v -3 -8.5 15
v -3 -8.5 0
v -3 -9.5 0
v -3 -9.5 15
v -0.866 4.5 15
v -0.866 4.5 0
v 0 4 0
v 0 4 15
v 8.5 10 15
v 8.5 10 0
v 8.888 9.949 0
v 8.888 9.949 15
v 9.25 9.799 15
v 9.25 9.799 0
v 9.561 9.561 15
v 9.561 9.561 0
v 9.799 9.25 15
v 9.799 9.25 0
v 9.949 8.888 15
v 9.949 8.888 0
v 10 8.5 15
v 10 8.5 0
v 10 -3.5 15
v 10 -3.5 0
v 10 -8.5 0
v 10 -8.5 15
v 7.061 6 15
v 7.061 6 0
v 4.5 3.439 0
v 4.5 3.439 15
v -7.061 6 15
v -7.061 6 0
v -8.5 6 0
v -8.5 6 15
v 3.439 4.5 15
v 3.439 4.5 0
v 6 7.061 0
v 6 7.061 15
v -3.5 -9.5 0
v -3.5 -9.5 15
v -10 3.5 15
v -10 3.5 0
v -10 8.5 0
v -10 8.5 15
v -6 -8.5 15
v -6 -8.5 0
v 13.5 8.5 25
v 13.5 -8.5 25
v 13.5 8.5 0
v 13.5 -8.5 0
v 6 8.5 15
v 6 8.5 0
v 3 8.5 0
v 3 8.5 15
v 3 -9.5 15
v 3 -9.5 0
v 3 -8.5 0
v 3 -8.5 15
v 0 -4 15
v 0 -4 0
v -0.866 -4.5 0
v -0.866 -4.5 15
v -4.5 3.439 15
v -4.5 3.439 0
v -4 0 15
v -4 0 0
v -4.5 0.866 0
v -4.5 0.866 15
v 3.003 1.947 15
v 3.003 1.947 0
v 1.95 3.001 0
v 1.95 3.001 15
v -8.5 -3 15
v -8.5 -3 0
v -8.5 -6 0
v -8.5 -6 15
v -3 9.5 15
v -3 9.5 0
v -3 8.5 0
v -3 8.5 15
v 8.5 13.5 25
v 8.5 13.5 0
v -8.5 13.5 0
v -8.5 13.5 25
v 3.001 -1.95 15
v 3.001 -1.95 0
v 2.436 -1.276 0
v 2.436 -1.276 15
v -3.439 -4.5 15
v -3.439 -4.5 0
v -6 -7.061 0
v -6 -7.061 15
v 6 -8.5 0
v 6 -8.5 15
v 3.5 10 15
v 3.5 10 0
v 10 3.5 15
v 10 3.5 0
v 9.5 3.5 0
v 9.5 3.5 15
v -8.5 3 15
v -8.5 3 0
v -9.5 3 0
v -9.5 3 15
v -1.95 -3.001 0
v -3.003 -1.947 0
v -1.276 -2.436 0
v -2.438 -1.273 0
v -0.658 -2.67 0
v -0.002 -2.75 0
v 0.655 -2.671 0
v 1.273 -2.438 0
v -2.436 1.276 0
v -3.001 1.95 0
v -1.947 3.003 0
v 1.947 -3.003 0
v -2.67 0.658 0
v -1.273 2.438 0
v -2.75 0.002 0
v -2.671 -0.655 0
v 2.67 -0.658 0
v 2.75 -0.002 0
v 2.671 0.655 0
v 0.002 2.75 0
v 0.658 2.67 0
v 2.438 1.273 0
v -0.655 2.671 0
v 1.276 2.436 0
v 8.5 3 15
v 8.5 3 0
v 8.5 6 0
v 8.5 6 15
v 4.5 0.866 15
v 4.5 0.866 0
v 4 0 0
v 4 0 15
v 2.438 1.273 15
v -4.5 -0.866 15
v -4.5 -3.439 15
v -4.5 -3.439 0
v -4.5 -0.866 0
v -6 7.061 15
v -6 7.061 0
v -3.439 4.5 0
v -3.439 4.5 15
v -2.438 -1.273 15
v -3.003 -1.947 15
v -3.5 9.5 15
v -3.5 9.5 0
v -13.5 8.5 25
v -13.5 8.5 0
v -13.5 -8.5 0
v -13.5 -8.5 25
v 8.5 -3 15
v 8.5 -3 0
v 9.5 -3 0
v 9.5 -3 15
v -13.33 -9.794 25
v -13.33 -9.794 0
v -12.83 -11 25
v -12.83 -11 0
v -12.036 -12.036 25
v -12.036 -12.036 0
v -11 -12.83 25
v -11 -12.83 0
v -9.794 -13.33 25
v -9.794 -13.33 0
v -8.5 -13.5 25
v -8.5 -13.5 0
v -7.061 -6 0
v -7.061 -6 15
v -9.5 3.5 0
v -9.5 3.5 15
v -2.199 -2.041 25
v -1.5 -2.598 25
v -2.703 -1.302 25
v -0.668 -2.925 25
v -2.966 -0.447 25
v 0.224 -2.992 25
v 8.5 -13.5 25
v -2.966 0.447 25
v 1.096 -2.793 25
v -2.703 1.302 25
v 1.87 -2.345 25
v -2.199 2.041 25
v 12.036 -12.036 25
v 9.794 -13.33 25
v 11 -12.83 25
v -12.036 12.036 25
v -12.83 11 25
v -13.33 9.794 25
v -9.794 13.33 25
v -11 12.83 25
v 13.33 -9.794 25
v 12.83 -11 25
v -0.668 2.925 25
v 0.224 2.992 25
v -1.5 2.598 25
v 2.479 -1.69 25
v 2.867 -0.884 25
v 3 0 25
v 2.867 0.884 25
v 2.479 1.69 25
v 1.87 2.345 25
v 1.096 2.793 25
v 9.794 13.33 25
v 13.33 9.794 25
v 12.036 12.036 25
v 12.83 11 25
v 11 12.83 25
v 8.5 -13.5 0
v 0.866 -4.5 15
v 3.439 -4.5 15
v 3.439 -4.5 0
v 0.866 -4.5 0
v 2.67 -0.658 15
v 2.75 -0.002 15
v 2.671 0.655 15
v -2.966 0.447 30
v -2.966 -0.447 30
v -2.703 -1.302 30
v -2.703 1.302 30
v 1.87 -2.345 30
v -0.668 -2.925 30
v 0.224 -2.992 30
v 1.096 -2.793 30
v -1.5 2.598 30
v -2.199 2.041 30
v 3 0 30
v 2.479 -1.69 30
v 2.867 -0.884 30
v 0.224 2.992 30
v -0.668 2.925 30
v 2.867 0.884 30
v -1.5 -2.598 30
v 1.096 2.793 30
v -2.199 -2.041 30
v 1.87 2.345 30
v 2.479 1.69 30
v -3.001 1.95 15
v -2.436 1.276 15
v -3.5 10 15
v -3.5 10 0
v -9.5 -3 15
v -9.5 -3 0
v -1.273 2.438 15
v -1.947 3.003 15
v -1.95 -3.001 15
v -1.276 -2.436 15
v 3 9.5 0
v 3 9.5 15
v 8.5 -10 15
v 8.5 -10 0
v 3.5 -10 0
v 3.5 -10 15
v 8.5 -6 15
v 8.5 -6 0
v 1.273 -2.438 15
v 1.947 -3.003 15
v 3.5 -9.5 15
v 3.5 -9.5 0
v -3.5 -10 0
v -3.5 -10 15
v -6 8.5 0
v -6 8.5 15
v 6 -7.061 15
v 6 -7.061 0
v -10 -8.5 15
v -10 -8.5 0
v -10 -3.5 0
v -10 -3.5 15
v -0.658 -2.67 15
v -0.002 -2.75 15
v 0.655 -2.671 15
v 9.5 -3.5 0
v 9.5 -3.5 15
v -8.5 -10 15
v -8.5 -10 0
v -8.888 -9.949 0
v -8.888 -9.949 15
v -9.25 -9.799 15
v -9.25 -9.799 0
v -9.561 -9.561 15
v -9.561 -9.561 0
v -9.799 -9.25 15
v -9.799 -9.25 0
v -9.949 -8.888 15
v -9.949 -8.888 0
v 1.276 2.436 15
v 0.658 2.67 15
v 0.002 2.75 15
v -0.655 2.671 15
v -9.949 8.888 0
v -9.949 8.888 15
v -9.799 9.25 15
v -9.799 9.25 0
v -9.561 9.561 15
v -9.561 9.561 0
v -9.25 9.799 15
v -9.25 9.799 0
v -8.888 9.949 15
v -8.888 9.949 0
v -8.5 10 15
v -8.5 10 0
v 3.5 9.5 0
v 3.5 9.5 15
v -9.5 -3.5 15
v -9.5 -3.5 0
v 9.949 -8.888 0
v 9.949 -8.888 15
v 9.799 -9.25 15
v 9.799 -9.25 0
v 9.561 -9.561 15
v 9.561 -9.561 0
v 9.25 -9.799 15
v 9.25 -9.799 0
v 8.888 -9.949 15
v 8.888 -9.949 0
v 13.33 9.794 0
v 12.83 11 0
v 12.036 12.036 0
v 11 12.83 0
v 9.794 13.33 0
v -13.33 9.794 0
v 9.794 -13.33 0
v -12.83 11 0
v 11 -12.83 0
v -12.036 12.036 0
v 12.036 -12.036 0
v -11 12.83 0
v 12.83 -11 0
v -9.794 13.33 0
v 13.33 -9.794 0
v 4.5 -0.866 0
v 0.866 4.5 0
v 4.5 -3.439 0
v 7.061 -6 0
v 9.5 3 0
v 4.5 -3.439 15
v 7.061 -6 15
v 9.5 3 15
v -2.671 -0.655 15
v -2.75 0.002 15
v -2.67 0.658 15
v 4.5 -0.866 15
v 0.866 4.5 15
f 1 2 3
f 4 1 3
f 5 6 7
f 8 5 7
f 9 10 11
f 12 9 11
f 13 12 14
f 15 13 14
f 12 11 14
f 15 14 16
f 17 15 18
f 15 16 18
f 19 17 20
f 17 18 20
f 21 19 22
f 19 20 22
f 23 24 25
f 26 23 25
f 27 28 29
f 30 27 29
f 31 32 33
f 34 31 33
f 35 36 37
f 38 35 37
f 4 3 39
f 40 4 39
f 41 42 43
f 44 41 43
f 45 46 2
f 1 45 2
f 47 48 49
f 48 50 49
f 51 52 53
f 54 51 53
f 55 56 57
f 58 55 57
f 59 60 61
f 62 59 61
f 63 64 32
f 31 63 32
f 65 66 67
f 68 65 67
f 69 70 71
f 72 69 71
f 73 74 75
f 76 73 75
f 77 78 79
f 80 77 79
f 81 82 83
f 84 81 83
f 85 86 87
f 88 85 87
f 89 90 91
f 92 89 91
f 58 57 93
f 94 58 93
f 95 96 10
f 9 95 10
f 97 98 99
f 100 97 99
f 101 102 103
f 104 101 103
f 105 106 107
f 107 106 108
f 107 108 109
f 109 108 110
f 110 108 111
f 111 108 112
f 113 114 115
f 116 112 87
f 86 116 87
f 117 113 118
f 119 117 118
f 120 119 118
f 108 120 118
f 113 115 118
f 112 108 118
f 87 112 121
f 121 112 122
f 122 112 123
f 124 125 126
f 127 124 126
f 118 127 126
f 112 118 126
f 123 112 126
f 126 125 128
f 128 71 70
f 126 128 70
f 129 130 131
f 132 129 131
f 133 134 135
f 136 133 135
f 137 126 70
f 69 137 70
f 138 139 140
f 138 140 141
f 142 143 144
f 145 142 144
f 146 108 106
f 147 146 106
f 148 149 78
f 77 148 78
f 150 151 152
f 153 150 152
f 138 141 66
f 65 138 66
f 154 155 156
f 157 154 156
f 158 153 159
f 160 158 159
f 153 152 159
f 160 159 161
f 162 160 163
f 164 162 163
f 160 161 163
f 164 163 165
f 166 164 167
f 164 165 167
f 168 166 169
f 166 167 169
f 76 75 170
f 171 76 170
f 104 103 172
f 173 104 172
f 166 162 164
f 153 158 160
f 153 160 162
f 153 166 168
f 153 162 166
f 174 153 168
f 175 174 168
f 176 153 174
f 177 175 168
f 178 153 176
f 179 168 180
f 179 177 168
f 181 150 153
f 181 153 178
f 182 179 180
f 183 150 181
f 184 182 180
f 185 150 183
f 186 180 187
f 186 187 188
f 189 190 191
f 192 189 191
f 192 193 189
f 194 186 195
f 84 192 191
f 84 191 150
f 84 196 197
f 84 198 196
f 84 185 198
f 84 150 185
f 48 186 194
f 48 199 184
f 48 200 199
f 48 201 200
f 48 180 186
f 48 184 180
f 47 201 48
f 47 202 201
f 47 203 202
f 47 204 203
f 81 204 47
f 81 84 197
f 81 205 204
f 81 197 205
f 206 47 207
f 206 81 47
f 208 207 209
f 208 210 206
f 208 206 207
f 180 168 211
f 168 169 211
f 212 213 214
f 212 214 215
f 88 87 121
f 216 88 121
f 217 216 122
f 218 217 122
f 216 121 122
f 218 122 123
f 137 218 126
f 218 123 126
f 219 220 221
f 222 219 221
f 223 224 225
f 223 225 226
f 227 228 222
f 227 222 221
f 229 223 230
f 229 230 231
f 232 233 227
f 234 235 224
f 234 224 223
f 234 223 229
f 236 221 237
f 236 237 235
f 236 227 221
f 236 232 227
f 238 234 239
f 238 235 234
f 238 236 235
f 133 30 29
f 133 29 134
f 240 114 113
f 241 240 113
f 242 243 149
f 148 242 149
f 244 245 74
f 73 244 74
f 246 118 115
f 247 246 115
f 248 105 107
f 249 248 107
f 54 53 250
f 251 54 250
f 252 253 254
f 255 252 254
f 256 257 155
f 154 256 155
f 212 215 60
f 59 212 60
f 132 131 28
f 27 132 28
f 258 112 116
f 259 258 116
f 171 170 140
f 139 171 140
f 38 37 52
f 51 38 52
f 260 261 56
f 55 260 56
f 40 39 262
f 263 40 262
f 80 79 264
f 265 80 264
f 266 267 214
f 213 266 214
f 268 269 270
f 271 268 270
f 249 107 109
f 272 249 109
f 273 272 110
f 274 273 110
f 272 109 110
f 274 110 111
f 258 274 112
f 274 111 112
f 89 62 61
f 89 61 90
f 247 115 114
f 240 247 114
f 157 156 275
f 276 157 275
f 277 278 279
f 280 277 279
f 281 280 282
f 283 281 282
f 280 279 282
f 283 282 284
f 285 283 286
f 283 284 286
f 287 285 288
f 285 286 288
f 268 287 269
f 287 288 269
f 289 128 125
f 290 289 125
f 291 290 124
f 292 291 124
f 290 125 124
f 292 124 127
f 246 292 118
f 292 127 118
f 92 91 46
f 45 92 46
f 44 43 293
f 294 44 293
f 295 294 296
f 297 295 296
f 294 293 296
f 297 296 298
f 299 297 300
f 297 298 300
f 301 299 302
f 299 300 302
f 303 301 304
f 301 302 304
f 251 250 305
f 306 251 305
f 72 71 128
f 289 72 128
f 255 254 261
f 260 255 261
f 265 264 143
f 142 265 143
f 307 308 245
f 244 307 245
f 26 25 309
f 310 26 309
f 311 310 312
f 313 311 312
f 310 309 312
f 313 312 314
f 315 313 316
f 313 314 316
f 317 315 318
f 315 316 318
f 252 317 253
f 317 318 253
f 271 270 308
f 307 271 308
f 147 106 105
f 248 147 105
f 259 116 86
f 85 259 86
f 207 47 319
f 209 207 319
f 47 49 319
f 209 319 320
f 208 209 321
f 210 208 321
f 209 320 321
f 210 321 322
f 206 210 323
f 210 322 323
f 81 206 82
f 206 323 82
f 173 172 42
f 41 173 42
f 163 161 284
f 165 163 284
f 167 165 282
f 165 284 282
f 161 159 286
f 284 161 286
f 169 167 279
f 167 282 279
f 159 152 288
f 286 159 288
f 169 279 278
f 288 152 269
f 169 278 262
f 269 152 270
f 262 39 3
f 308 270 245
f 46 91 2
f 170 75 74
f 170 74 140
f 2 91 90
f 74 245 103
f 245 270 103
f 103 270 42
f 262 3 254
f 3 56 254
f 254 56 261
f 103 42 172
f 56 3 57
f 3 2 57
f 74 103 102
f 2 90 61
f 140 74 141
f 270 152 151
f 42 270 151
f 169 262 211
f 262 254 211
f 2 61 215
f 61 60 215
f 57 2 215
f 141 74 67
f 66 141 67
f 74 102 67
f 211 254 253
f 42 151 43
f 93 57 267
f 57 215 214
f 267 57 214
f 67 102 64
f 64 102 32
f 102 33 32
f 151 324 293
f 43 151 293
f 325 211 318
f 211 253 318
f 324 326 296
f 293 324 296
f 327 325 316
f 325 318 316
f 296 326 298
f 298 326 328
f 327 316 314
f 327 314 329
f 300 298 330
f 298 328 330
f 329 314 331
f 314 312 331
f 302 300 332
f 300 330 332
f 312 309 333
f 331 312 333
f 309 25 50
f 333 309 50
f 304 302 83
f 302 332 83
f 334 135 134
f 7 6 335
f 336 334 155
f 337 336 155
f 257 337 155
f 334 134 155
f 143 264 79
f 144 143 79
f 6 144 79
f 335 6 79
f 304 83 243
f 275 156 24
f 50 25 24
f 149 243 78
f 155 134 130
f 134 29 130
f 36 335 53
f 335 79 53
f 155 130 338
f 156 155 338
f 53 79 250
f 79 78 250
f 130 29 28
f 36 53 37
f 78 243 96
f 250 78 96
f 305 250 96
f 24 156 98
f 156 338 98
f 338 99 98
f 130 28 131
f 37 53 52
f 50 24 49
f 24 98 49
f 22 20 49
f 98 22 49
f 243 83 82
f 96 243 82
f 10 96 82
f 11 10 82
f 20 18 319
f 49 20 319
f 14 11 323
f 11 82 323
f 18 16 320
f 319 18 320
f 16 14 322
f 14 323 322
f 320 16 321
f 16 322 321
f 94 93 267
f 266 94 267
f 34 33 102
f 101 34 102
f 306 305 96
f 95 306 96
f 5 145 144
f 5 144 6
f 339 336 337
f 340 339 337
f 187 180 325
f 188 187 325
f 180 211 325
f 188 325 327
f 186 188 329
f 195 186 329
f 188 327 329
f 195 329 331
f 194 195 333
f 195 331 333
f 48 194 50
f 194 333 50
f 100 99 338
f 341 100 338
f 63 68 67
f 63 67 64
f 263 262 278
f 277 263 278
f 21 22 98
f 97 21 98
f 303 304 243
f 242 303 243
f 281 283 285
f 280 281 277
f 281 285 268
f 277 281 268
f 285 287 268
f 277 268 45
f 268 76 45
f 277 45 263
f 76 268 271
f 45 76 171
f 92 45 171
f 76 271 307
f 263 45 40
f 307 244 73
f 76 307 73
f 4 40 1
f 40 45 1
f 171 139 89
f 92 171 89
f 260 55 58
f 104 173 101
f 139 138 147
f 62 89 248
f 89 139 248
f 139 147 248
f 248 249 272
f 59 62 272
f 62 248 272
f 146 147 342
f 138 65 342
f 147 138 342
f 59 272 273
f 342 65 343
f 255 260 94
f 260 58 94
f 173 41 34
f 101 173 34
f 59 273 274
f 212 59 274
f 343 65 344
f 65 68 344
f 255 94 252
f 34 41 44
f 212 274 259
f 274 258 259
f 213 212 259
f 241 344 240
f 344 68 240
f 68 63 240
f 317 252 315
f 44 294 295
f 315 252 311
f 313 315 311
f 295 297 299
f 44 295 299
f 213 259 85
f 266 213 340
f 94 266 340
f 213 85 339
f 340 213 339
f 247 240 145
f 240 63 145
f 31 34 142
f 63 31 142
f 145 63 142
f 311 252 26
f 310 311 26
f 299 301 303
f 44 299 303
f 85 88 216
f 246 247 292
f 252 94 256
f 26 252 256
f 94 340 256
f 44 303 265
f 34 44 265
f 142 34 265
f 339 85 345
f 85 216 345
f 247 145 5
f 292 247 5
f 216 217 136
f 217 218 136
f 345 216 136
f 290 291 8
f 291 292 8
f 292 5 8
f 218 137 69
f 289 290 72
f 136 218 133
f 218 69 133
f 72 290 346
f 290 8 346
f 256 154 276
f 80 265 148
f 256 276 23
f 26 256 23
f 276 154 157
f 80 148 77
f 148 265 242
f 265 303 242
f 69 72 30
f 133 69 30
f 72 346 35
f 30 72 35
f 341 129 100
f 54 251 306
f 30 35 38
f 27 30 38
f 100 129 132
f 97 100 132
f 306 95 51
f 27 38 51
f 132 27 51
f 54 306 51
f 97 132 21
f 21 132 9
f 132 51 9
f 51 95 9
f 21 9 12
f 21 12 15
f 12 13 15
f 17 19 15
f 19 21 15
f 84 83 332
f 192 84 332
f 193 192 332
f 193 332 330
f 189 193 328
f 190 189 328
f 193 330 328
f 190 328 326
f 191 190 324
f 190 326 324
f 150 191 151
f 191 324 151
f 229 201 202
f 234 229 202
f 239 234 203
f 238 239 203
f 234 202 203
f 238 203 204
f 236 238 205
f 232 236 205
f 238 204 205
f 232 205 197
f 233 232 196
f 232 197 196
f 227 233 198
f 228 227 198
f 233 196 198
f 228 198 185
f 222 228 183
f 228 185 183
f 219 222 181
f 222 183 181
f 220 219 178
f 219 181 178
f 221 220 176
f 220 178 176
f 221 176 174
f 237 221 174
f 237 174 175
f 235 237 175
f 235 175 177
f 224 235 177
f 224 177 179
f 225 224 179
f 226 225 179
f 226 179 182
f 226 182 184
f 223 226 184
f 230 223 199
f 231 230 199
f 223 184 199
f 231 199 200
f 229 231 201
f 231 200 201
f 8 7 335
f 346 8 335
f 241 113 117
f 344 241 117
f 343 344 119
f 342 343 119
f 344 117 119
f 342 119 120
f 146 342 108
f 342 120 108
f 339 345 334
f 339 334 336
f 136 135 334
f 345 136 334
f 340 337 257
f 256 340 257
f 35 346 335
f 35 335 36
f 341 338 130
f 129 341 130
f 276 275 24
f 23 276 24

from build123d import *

# Parameters (mm, degrees)
BOSS_EXTRU_5_DEPTH = 15
BOSS_EXTRU_6_DEPTH = 10
ESQUISSE7_R        = 3
BOSS_EXTRU_7_DEPTH = 5


# Read off the part's stored shape, not the designer's step: Boss.-Extru.5
with BuildPart() as part:
    # Boss.-Extru.5 outline → Boss.-Extru.5 (new body)
    # profile 1 of 2: a face of its own
    with BuildSketch(Plane.XY):
        with BuildLine():
            Line((-8.5, -13.5), (8.5, -13.5))
            ThreePointArc((8.5, -13.5), (12.035533906, -12.035533906), (13.5, -8.5))
            Line((13.5, -8.5), (13.5, 8.5))
            ThreePointArc((13.5, 8.5), (12.035533906, 12.035533906), (8.5, 13.5))
            Line((8.5, 13.5), (-8.5, 13.5))
            ThreePointArc((-8.5, 13.5), (-12.035533906, 12.035533906), (-13.5, 8.5))
            Line((-13.5, 8.5), (-13.5, -8.5))
            ThreePointArc((-13.5, -8.5), (-12.035533906, -12.035533906), (-8.5, -13.5))
        make_face()
        with BuildLine():
            Line((-10, 3.5), (-10, 8.5))
            ThreePointArc((-10, 8.5), (-9.560660172, 9.560660172), (-8.5, 10))
            Line((-8.5, 10), (-3.5, 10))
            Line((-3.5, 10), (-3.5, 9.5))
            Line((-3.5, 9.5), (-3, 9.5))
            Line((-3, 9.5), (-3, 8.5))
            Line((-3, 8.5), (-6, 8.5))
            Line((-6, 8.5), (-6, 7.060660172))
            Line((-6, 7.060660172), (-3.439339828, 4.5))
            Line((-3.439339828, 4.5), (-0.866025404, 4.5))
            Line((-0.866025404, 4.5), (0, 4))
            Line((0, 4), (0.866025404, 4.5))
            Line((0.866025404, 4.5), (3.439339828, 4.5))
            Line((3.439339828, 4.5), (6, 7.060660172))
            Line((6, 7.060660172), (6, 8.5))
            Line((6, 8.5), (3, 8.5))
            Line((3, 8.5), (3, 9.5))
            Line((3, 9.5), (3.5, 9.5))
            Line((3.5, 9.5), (3.5, 10))
            Line((3.5, 10), (8.5, 10))
            ThreePointArc((8.5, 10), (9.560660172, 9.560660172), (10, 8.5))
            Line((10, 8.5), (10, 3.5))
            Line((10, 3.5), (9.5, 3.5))
            Line((9.5, 3.5), (9.5, 3))
            Line((9.5, 3), (8.5, 3))
            Line((8.5, 3), (8.5, 6))
            Line((8.5, 6), (7.060660172, 6))
            Line((7.060660172, 6), (4.5, 3.439339828))
            Line((4.5, 3.439339828), (4.5, 0.866025404))
            Line((4.5, 0.866025404), (4, 0))
            Line((4, 0), (4.5, -0.866025404))
            Line((4.5, -0.866025404), (4.5, -3.439339828))
            Line((4.5, -3.439339828), (7.060660172, -6))
            Line((7.060660172, -6), (8.5, -6))
            Line((8.5, -6), (8.5, -3))
            Line((8.5, -3), (9.5, -3))
            Line((9.5, -3), (9.5, -3.5))
            Line((9.5, -3.5), (10, -3.5))
            Line((10, -3.5), (10, -8.5))
            ThreePointArc((10, -8.5), (9.560660172, -9.560660172), (8.5, -10))
            Line((8.5, -10), (3.5, -10))
            Line((3.5, -10), (3.5, -9.5))
            Line((3.5, -9.5), (3, -9.5))
            Line((3, -9.5), (3, -8.5))
            Line((3, -8.5), (6, -8.5))
            Line((6, -8.5), (6, -7.060660172))
            Line((6, -7.060660172), (3.439339828, -4.5))
            Line((3.439339828, -4.5), (0.866025404, -4.5))
            Line((0.866025404, -4.5), (0, -4))
            Line((0, -4), (-0.866025404, -4.5))
            Line((-0.866025404, -4.5), (-3.439339828, -4.5))
            Line((-3.439339828, -4.5), (-6, -7.060660172))
            Line((-6, -7.060660172), (-6, -8.5))
            Line((-6, -8.5), (-3, -8.5))
            Line((-3, -8.5), (-3, -9.5))
            Line((-3, -9.5), (-3.5, -9.5))
            Line((-3.5, -9.5), (-3.5, -10))
            Line((-3.5, -10), (-8.5, -10))
            ThreePointArc((-8.5, -10), (-9.560660172, -9.560660172), (-10, -8.5))
            Line((-10, -8.5), (-10, -3.5))
            Line((-10, -3.5), (-9.5, -3.5))
            Line((-9.5, -3.5), (-9.5, -3))
            Line((-9.5, -3), (-8.5, -3))
            Line((-8.5, -3), (-8.5, -6))
            Line((-8.5, -6), (-7.060660172, -6))
            Line((-7.060660172, -6), (-4.5, -3.439339828))
            Line((-4.5, -3.439339828), (-4.5, -0.866025404))
            Line((-4.5, -0.866025404), (-4, 0))
            Line((-4, 0), (-4.5, 0.866025404))
            Line((-4.5, 0.866025404), (-4.5, 3.439339828))
            Line((-4.5, 3.439339828), (-7.060660172, 6))
            Line((-7.060660172, 6), (-8.5, 6))
            Line((-8.5, 6), (-8.5, 3))
            Line((-8.5, 3), (-9.5, 3))
            Line((-9.5, 3), (-9.5, 3.5))
            Line((-9.5, 3.5), (-10, 3.5))
        make_face(mode=Mode.SUBTRACT)
    # profile 2 of 2: a face of its own
    with BuildSketch(Plane.XY):
        with BuildLine():
            Line((1.949592103, 3.000876196), (1.276279893, 2.435900169))
            ThreePointArc((1.276279893, 2.435900169), (0.001756003, 2.749999439), (-1.273167982, 2.43752811))
            Line((-1.273167982, 2.43752811), (-1.947287092, 3.003181207))
            Line((-1.947287092, 3.003181207), (-3.000876196, 1.949592103))
            Line((-3.000876196, 1.949592103), (-2.435900169, 1.276279893))
            ThreePointArc((-2.435900169, 1.276279893), (-2.749999439, 0.001756003), (-2.43752811, -1.273167982))
            Line((-2.43752811, -1.273167982), (-3.003181207, -1.947287092))
            Line((-3.003181207, -1.947287092), (-1.949592103, -3.000876196))
            Line((-1.949592103, -3.000876196), (-1.276279893, -2.435900169))
            ThreePointArc((-1.276279893, -2.435900169), (-0.001756003, -2.749999439), (1.273167982, -2.43752811))
            Line((1.273167982, -2.43752811), (1.947287092, -3.003181207))
            Line((1.947287092, -3.003181207), (3.000876196, -1.949592103))
            Line((3.000876196, -1.949592103), (2.435900169, -1.276279893))
            ThreePointArc((2.435900169, -1.276279893), (2.749999439, -0.001756003), (2.43752811, 1.273167982))
            Line((2.43752811, 1.273167982), (3.003181207, 1.947287092))
            Line((3.003181207, 1.947287092), (1.949592103, 3.000876196))
        make_face()
    extrude(amount=BOSS_EXTRU_5_DEPTH)

    # Esquisse6 → Boss.-Extru.6 (add)
    with BuildSketch(Plane.XY.offset(15)):
        with BuildLine():
            Line((-13.5, 8.5), (-13.5, -8.5))
            ThreePointArc((-13.5, -8.5), (-12.035533906, -12.035533906), (-8.5, -13.5))
            Line((-8.5, -13.5), (8.5, -13.5))
            ThreePointArc((8.5, -13.5), (12.035533906, -12.035533906), (13.5, -8.5))
            Line((13.5, -8.5), (13.5, 8.5))
            ThreePointArc((13.5, 8.5), (12.035533906, 12.035533906), (8.5, 13.5))
            Line((8.5, 13.5), (-8.5, 13.5))
            ThreePointArc((-8.5, 13.5), (-12.035533906, 12.035533906), (-13.5, 8.5))
        make_face()
    extrude(amount=BOSS_EXTRU_6_DEPTH)

    # Esquisse7 → Boss.-Extru.7 (add)
    with BuildSketch(Plane.XY.offset(25)):
        Circle(ESQUISSE7_R)
    extrude(amount=BOSS_EXTRU_7_DEPTH)


solid = part.part
